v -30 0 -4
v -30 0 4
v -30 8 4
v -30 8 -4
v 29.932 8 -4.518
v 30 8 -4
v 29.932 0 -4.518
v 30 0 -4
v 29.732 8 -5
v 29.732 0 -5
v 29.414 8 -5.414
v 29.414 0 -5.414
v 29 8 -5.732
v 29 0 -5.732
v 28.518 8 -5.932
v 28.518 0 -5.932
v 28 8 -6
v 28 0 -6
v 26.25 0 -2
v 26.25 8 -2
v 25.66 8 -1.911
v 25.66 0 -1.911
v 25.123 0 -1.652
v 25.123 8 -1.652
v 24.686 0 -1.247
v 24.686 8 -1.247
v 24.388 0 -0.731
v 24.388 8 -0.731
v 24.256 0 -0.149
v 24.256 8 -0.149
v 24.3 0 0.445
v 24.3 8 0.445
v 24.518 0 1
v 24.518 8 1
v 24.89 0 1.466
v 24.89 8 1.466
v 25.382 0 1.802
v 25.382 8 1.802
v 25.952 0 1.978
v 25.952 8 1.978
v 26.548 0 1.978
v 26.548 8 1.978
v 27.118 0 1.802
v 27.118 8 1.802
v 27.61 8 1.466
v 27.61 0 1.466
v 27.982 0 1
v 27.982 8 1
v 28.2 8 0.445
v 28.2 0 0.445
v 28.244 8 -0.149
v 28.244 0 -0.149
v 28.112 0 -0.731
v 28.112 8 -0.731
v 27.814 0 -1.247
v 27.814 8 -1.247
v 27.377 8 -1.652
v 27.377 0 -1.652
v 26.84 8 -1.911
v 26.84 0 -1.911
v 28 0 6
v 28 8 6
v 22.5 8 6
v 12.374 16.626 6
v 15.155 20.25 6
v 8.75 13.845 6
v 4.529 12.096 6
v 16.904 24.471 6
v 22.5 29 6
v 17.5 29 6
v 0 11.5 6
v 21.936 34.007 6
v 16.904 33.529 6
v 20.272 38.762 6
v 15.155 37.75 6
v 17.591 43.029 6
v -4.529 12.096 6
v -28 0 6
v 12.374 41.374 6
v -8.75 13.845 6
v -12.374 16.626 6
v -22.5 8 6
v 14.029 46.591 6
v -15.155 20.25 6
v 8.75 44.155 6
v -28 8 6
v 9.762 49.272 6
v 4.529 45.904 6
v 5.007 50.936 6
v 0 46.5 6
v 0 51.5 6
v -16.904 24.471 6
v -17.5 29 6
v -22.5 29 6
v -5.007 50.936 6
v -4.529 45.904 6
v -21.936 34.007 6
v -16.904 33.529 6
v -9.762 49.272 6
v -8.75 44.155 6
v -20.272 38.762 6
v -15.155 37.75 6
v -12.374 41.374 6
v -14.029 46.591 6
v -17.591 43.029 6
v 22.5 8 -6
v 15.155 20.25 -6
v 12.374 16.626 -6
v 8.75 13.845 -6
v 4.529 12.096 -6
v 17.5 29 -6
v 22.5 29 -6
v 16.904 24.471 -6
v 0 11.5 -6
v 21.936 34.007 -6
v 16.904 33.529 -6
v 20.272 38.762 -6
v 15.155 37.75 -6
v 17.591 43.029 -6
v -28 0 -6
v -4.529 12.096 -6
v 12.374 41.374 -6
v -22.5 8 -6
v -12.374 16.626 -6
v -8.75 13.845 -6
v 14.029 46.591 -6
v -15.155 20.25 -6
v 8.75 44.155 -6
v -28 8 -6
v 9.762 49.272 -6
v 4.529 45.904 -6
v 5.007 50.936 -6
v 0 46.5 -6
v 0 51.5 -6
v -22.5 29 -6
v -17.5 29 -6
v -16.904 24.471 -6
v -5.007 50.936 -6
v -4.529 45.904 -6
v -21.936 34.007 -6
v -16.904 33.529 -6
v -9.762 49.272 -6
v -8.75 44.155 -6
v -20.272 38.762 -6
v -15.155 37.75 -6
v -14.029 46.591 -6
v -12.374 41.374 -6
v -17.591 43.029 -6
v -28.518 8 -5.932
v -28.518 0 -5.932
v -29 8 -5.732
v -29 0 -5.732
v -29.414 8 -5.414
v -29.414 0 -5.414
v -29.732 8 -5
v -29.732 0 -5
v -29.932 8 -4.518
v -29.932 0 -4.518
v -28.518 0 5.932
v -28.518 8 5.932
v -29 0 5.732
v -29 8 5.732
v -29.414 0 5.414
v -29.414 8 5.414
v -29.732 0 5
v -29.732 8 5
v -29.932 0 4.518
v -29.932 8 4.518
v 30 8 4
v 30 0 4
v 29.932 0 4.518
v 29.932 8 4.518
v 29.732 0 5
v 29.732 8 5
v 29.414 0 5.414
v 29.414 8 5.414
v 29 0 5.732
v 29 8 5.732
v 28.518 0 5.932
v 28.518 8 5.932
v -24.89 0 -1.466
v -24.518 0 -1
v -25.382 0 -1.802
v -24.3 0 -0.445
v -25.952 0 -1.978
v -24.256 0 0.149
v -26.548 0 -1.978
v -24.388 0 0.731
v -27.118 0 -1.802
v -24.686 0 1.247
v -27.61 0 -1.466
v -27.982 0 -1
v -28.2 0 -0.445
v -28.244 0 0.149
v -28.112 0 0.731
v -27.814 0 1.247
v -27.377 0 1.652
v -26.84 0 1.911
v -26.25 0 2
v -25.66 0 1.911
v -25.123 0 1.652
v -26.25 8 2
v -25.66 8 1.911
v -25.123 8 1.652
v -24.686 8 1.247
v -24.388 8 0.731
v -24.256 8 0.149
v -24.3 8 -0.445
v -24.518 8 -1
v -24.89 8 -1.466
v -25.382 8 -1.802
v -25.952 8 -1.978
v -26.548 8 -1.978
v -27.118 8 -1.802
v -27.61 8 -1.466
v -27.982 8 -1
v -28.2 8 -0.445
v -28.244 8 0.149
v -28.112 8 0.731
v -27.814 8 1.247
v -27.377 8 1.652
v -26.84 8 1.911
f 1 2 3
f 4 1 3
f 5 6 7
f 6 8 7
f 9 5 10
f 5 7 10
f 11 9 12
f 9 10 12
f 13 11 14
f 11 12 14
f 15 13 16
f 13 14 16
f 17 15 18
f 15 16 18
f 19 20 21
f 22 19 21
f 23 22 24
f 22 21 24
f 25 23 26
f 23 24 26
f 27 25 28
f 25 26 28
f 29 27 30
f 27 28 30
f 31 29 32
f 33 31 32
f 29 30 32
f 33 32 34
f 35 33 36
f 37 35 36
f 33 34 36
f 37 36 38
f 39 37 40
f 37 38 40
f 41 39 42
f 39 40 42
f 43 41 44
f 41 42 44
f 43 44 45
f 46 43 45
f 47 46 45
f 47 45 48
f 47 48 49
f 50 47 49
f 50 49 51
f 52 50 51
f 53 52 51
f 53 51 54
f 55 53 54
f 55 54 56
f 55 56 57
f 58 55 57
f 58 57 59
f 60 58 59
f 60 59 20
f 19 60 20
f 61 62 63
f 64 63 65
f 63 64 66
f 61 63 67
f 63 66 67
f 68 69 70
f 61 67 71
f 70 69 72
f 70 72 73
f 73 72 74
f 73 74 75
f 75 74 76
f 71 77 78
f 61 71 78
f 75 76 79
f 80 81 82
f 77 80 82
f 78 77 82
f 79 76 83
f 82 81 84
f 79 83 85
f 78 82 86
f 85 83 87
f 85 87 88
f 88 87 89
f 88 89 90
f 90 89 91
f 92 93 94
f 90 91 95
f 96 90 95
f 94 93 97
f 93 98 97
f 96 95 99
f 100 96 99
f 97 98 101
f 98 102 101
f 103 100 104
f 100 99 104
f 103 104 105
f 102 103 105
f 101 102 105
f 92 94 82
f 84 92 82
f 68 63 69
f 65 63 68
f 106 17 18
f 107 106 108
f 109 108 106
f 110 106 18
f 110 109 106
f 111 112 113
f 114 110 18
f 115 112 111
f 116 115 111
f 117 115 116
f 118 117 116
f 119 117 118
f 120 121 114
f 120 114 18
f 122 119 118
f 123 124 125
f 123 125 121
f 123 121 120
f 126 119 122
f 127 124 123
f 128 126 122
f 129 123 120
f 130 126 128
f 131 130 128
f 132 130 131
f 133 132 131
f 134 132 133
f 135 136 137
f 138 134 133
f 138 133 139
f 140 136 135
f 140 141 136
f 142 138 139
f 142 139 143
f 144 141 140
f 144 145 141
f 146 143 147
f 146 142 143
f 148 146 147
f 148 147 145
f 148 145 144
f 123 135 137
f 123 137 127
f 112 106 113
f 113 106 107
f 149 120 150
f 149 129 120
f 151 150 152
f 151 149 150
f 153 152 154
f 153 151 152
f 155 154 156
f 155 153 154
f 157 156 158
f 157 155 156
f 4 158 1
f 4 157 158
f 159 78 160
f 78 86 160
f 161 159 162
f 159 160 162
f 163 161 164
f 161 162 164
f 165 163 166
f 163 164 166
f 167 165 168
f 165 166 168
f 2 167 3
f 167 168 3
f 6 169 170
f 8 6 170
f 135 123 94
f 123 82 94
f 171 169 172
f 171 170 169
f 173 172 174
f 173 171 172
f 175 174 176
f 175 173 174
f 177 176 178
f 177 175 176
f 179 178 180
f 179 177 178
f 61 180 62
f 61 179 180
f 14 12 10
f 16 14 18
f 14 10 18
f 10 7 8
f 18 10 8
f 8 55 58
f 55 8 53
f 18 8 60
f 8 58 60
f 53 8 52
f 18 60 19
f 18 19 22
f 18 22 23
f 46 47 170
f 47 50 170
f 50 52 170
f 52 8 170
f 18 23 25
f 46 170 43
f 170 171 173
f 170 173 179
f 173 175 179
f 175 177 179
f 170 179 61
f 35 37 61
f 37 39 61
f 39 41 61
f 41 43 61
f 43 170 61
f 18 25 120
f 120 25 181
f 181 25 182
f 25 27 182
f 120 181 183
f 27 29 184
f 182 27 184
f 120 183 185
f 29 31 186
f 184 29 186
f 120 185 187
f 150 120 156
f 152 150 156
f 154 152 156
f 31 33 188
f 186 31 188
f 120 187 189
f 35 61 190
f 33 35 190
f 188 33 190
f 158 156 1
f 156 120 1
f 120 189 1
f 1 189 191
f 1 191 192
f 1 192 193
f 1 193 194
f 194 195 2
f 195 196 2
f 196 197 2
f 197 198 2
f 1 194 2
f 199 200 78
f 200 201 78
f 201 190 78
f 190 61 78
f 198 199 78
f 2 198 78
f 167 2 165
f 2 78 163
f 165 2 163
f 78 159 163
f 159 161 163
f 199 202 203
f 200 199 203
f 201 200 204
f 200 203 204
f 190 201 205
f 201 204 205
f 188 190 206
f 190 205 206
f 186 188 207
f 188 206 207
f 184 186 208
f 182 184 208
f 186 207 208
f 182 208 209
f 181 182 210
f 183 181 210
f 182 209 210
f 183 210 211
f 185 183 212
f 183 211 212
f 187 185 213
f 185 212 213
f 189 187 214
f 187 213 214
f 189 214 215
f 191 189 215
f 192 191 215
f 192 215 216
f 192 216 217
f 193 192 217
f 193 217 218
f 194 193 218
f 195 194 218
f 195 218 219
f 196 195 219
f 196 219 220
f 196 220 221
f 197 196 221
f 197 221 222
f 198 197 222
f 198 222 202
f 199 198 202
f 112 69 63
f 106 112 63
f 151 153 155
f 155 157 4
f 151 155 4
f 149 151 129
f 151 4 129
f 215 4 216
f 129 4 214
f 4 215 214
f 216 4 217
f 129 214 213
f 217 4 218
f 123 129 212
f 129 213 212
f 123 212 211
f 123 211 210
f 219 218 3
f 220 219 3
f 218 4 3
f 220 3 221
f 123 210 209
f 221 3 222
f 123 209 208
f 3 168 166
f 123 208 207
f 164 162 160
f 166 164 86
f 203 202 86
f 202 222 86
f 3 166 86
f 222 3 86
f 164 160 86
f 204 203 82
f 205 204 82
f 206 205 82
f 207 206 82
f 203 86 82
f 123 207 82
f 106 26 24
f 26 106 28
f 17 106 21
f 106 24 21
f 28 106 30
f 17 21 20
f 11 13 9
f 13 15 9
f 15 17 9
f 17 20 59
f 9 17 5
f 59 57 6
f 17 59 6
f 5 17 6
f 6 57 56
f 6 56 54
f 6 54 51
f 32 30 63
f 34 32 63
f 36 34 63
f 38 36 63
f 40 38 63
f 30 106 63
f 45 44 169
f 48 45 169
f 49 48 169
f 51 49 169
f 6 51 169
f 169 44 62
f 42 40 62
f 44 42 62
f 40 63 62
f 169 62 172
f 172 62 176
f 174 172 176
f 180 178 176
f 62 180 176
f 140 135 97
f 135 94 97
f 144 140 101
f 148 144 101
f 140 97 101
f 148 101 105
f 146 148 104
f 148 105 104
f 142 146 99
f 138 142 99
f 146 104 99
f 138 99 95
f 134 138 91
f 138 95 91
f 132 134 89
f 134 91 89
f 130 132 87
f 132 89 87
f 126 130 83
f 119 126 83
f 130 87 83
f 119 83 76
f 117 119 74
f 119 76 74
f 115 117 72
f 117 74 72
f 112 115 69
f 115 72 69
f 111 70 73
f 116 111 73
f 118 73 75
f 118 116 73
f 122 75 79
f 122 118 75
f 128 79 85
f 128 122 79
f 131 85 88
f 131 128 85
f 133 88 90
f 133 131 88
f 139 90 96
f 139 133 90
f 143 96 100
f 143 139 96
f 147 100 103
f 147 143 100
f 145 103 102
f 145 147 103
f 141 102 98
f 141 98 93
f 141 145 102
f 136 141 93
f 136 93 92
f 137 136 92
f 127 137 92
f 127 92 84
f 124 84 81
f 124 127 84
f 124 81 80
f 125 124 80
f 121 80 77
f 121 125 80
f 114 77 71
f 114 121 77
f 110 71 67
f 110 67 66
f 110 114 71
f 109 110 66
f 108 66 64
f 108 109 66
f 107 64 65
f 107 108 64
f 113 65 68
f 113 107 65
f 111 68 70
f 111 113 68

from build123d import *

# Parameters (mm, degrees)
CROQUIS1_R              = 17.5
SALIENTE_EXTRUIR1_DEPTH = 6
CROQUIS2_R              = 2
CORTAR_EXTRUIR1_DEPTH   = 54.181293704
REDONDEO1_R             = 2


with BuildPart() as part:
    # Croquis1 → Saliente-Extruir1 (new, symmetric)
    with BuildSketch(Plane.XY):
        with BuildLine():
            Line((30, 0), (-30, 0))
            Line((-30, 0), (-30, 8))
            Line((-30, 8), (-22.5, 8))
            Line((-22.5, 8), (-22.5, 29))
            ThreePointArc((-22.5, 29), (0, 51.5), (22.5, 29))
            Line((22.5, 29), (22.5, 8))
            Line((22.5, 8), (30, 8))
            Line((30, 8), (30, 0))
        make_face()
        with Locations((0, 29)):
            Circle(CROQUIS1_R, mode=Mode.SUBTRACT)
    extrude(amount=SALIENTE_EXTRUIR1_DEPTH, both=True)

    # Croquis2 → Cortar-Extruir1 (cut, through all)
    with BuildSketch(Plane(origin=(0, 8, 0), x_dir=(1, 0, 0), z_dir=(0, 1, 0))):
        with Locations(Location((-26.25, 0, 0), (0, 0, 270))):
            Circle(CROQUIS2_R)
        with Locations(Location((26.25, 0, 0), (0, 0, 90))):
            Circle(CROQUIS2_R)
    extrude(amount=-CORTAR_EXTRUIR1_DEPTH, mode=Mode.SUBTRACT)

    # Redondeo1
    redondeo1_edges = [part.edges().sort_by_distance(p)[0] for p in [
        (30, 4, 6),
        (-30, 4, -6),
        (-30, 4, 6),
        (30, 4, -6),
    ]]
    fillet(redondeo1_edges, radius=REDONDEO1_R)


solid = part.part
